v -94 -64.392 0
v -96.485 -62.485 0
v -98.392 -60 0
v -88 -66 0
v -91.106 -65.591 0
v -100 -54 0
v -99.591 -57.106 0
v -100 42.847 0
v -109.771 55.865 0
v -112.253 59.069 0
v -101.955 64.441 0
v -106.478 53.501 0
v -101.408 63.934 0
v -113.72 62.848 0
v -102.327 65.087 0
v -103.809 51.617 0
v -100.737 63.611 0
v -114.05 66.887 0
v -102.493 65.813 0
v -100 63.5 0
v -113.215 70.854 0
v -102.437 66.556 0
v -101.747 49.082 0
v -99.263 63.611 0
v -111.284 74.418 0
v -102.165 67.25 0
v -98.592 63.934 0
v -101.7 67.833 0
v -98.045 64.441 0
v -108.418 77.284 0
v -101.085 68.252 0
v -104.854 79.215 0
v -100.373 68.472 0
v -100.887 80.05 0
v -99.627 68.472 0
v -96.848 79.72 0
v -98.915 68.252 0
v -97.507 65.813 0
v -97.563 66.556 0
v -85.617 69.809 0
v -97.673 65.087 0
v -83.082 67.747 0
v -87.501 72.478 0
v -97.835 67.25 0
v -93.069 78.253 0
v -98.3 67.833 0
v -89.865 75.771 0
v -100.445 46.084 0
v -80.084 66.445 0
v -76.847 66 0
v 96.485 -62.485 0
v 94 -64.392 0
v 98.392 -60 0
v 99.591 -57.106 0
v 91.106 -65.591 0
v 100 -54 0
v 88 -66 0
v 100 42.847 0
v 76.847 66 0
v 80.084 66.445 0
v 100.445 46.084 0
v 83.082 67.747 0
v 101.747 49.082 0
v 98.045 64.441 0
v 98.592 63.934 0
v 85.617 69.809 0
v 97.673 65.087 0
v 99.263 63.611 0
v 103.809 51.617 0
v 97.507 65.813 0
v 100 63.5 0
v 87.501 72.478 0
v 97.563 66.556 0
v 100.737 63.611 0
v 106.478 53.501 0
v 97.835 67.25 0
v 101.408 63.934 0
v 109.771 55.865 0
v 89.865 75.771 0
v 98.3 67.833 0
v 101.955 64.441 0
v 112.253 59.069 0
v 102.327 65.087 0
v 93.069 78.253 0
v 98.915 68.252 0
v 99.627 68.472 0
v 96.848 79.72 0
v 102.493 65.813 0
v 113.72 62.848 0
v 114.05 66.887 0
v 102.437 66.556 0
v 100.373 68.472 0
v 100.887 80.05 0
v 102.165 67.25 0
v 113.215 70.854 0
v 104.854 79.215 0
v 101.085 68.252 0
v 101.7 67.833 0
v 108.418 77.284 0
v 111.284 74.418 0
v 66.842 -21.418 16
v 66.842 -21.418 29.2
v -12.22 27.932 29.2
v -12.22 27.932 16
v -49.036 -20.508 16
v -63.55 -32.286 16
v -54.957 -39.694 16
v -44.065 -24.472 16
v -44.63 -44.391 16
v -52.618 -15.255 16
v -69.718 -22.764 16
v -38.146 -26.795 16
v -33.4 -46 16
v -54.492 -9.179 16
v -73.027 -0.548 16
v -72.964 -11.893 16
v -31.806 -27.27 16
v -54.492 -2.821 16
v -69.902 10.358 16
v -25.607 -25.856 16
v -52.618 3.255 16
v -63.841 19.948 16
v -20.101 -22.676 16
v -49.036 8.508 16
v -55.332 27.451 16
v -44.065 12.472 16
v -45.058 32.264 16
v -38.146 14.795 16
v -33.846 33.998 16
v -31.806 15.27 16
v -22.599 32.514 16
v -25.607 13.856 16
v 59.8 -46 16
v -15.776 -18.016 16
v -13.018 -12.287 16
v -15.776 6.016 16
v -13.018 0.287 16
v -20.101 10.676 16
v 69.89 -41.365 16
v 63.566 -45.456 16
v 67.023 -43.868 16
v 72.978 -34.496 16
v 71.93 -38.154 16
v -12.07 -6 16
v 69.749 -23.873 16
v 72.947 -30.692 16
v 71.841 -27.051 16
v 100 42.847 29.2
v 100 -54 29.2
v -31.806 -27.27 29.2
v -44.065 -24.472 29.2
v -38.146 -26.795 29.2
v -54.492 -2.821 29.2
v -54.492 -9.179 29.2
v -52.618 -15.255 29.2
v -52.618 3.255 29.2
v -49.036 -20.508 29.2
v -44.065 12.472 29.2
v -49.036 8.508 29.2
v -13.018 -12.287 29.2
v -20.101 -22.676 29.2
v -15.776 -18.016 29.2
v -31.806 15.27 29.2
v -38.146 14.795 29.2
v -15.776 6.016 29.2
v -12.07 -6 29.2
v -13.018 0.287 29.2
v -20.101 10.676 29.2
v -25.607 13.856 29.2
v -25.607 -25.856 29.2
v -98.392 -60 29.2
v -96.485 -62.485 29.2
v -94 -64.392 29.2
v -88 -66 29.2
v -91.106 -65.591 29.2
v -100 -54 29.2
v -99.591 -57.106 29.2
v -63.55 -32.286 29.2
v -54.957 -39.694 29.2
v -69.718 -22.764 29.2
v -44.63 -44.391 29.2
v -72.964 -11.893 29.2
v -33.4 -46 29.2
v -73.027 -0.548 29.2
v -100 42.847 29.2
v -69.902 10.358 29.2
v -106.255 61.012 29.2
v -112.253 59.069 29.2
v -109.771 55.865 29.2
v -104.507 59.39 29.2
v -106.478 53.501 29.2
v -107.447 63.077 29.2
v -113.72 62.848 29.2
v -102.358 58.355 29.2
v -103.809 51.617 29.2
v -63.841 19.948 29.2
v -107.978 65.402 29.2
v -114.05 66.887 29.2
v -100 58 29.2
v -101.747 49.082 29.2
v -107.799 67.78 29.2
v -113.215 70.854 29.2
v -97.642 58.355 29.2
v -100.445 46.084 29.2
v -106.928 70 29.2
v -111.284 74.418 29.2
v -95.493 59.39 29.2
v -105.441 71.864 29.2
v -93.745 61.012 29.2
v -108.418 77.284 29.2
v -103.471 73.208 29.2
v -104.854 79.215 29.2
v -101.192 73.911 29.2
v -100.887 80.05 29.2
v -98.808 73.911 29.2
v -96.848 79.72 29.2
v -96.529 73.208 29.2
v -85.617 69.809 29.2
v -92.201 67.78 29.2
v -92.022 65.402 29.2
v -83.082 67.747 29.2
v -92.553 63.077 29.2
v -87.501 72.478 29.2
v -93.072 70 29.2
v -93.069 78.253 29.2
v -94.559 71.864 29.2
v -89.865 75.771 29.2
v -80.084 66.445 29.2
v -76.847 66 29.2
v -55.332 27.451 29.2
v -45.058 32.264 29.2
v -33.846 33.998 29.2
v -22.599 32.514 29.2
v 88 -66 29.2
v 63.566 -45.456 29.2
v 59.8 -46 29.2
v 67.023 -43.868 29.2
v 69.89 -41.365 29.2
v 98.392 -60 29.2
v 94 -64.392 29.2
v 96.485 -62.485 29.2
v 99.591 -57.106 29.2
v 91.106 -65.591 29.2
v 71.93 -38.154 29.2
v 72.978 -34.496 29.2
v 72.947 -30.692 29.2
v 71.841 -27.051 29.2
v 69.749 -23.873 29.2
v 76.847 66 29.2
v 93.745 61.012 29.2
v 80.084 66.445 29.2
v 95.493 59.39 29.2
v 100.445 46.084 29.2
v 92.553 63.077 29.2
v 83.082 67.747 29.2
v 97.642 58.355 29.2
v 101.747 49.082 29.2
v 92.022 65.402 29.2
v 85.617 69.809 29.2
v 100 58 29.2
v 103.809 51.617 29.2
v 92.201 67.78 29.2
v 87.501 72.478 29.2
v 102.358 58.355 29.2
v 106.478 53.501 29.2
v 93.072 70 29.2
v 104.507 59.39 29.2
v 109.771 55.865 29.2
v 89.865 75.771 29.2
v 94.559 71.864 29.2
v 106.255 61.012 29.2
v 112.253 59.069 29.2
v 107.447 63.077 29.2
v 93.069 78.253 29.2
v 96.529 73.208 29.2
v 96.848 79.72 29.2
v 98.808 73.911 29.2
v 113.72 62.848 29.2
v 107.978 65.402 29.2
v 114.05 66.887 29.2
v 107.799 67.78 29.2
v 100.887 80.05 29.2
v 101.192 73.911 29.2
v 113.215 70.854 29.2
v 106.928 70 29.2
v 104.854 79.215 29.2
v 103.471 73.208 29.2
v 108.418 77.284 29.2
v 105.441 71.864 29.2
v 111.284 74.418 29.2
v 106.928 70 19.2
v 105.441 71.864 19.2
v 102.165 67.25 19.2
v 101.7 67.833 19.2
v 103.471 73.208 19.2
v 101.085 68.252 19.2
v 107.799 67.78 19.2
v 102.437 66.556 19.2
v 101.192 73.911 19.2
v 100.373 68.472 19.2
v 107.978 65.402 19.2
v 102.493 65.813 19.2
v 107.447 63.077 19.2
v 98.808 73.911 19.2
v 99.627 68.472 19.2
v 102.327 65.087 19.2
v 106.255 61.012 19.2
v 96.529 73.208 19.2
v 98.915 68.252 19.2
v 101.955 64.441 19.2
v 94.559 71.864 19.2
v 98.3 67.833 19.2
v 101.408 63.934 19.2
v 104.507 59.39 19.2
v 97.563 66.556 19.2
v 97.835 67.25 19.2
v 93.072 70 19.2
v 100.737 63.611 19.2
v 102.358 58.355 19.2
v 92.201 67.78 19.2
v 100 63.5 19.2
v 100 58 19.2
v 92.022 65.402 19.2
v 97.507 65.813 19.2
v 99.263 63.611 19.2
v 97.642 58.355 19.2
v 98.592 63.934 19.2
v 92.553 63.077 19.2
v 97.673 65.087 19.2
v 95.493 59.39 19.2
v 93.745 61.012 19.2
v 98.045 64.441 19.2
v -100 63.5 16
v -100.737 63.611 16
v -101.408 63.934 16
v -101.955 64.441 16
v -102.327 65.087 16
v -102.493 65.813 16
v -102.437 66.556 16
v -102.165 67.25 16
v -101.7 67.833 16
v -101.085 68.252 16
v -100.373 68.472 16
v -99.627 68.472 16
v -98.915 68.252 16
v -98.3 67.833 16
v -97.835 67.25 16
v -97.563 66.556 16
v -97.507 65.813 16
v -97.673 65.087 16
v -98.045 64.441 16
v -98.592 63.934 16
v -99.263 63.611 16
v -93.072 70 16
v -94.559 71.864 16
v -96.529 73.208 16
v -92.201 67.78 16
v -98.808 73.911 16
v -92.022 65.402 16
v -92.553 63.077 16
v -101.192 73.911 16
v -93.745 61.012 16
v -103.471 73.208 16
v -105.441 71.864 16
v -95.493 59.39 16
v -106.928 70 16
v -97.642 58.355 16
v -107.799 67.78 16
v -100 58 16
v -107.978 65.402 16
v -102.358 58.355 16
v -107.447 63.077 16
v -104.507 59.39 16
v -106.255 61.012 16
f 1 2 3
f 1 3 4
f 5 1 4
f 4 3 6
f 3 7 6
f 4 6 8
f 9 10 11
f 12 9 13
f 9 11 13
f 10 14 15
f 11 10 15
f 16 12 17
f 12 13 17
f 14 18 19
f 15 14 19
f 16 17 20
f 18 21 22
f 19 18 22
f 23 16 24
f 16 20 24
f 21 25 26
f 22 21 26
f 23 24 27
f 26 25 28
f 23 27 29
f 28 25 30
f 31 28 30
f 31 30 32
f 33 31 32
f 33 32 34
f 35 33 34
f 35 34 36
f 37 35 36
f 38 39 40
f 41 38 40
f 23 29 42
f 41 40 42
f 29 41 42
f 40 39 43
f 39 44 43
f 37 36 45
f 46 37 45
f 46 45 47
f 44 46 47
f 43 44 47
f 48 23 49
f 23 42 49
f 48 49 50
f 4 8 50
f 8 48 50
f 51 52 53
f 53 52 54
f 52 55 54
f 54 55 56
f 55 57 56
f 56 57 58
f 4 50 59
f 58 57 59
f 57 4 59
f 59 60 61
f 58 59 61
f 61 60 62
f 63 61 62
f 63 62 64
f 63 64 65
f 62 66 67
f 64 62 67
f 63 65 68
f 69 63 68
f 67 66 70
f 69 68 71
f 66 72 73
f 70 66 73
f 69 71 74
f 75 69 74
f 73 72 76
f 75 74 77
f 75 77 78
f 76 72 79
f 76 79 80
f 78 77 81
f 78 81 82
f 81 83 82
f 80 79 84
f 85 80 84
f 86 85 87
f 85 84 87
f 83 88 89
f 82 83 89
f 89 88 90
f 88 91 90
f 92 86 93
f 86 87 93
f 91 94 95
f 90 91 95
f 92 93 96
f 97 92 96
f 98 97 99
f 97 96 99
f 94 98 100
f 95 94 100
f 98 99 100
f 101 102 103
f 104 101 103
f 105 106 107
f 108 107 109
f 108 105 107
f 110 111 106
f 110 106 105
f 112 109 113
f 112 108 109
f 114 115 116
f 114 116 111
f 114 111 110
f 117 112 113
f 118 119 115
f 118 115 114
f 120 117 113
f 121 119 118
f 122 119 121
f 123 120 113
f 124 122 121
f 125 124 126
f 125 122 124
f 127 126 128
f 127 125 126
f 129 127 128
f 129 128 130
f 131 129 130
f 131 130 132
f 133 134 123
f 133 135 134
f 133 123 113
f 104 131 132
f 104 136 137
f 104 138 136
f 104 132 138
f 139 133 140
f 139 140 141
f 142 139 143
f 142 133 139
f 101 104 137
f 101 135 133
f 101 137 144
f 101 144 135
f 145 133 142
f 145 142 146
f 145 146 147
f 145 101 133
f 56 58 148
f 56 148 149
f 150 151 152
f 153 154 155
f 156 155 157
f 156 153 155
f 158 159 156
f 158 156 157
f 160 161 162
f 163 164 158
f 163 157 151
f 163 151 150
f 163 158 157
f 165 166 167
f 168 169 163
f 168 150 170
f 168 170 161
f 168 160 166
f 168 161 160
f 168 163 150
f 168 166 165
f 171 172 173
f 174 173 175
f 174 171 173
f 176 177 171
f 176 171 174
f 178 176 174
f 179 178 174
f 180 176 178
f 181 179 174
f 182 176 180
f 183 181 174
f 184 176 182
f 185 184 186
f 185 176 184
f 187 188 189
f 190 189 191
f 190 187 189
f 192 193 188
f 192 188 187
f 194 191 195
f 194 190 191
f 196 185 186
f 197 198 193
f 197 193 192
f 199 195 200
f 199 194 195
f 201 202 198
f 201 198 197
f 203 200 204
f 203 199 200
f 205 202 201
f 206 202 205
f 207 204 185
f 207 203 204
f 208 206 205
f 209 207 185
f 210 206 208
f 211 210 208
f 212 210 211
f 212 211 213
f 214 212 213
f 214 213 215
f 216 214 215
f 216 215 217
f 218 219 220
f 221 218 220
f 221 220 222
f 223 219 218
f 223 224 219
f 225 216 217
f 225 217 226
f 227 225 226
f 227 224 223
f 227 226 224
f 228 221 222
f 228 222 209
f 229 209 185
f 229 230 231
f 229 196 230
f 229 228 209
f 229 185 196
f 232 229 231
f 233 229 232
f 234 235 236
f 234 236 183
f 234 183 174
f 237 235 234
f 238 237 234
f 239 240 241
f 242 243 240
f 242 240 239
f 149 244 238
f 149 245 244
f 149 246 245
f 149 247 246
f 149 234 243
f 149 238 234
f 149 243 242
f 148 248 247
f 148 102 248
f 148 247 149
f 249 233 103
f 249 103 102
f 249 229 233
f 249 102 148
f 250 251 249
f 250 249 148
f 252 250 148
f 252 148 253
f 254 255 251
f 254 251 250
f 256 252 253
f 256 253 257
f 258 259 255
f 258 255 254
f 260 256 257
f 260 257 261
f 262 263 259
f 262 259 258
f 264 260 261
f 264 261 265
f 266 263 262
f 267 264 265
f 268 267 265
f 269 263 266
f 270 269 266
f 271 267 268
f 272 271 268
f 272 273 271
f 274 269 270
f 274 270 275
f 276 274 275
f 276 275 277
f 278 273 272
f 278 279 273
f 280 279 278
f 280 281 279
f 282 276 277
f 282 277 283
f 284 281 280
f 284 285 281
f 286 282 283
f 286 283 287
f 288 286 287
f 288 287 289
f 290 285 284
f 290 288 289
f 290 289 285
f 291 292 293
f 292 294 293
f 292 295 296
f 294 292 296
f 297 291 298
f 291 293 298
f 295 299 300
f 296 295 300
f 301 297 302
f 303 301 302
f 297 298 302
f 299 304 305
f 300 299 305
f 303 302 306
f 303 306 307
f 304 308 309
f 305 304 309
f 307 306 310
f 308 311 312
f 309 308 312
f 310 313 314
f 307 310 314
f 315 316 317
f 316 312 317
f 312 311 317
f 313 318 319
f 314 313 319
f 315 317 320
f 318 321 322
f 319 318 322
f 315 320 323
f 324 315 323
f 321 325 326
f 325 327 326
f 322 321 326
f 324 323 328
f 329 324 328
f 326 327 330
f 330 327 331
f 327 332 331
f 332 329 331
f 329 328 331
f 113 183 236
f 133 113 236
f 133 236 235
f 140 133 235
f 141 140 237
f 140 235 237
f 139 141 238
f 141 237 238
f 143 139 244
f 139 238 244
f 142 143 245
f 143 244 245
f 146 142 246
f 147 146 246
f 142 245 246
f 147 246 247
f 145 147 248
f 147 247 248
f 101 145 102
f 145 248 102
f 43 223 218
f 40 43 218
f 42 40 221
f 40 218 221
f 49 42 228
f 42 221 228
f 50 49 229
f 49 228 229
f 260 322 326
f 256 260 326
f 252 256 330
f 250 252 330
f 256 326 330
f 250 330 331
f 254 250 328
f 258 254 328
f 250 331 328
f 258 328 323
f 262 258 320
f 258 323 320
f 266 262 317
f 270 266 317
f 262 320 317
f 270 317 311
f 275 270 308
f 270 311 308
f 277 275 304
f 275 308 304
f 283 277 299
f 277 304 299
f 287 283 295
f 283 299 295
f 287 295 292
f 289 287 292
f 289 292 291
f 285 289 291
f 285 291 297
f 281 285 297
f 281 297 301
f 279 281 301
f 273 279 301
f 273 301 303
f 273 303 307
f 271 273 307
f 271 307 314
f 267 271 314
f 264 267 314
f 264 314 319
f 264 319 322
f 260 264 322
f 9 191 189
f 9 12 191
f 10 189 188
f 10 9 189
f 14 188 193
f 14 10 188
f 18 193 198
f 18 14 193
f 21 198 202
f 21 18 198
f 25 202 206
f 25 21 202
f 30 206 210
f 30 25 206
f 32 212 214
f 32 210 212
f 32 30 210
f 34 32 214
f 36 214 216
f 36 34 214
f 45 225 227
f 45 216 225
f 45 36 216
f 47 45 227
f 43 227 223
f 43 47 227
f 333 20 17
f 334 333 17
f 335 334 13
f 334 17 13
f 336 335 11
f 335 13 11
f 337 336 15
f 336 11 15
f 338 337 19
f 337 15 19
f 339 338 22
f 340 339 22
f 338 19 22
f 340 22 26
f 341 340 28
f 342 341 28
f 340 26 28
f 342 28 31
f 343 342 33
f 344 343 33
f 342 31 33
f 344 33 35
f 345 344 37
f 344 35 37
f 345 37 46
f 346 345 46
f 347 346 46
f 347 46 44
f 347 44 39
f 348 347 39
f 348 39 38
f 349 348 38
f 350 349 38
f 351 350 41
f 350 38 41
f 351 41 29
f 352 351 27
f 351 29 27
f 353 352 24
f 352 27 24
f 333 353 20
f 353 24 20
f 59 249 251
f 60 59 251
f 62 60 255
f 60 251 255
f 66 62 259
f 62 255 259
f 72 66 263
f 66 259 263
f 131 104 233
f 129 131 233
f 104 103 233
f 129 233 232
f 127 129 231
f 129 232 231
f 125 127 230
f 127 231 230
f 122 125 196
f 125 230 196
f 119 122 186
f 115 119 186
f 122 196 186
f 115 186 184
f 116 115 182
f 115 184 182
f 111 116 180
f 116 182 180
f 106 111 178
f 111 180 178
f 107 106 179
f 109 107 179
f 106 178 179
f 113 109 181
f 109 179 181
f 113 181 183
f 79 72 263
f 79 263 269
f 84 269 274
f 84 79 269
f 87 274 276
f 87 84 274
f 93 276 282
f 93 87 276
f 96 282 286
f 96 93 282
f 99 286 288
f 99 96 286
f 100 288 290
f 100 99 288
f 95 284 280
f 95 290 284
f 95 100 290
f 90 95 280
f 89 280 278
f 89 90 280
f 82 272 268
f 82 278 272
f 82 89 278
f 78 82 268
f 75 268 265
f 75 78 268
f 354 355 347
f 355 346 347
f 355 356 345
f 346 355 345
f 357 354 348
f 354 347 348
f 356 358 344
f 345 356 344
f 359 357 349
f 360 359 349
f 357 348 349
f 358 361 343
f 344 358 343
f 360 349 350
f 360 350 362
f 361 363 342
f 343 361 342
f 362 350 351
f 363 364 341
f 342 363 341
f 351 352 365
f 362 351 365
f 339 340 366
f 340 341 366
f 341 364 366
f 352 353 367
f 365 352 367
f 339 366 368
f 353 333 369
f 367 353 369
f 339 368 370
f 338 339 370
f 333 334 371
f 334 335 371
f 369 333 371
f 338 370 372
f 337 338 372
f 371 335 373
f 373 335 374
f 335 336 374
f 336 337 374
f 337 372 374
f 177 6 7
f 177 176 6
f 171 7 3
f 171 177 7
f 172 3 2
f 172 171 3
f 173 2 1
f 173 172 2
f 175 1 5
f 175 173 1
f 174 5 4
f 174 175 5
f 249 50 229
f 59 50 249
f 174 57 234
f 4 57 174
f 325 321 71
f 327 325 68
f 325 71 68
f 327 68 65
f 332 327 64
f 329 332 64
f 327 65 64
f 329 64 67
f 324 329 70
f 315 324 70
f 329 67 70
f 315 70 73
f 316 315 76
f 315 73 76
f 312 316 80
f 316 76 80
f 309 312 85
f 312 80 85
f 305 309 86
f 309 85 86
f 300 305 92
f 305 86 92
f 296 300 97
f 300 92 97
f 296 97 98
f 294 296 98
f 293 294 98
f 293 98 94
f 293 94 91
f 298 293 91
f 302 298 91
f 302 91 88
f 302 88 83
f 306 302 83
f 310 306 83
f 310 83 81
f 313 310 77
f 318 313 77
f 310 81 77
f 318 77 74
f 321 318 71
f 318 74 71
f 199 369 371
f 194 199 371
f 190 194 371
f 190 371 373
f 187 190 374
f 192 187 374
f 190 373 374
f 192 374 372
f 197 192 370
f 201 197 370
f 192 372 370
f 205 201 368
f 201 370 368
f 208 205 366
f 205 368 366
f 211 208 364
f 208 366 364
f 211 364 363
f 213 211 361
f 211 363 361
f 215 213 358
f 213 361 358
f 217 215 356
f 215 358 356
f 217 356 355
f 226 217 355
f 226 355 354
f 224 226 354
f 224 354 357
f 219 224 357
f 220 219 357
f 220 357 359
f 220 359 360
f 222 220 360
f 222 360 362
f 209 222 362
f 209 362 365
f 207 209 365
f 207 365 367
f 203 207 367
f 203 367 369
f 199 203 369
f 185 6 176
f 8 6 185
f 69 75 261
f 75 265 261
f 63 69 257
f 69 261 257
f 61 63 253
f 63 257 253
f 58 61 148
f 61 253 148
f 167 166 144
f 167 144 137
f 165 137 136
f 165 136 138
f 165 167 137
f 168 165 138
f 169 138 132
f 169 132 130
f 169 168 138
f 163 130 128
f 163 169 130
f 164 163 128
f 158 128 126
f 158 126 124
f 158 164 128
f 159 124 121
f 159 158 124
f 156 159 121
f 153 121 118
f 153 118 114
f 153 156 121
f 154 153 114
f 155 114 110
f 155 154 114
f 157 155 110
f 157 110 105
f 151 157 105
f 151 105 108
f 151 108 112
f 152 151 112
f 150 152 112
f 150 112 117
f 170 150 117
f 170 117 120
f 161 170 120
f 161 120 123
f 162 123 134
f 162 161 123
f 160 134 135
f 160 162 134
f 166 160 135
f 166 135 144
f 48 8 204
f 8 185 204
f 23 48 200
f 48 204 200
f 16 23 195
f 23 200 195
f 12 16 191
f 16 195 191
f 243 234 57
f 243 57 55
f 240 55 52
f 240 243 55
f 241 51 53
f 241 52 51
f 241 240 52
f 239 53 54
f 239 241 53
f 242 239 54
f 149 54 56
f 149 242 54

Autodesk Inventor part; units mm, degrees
ref_plane "YZ Plane" through (0, 0, 0) normal (1, 0, 0) x (0, 1, 0)
ref_plane "XZ Plane" through (0, 0, 0) normal (0, 1, 0) x (-1, 0, 0)
ref_plane "XY Plane" through (0, 0, 0) normal (0, 0, 1) x (1, 0, 0)
sketch "Sketch1" plane through (0, 0, 0) normal (0, 0, 1) x (1, 0, 0)
  line L0 (-85.9222, 66) -> (85.9222, 66)
  line L1 (100, 51.9222) -> (100, -66)
  line L2 (100, -66) -> (-100, -66)
  line L3 (-100, -66) -> (-100, 51.9222)
  line L4 (-100, 66) -> (100, -66) construction
  line L5 (100, 66) -> (-100, -66) construction
  arc A0 (-85.9222, 66) -> (-100, 51.9222) centre (-100, 66) ccw
  arc A1 (100, 51.9222) -> (85.9222, 66) centre (100, 66) ccw
  line L6 (0, 116.2908) -> (0, -96.3818) projected
  line L7 (-167.8726, 0) -> (167.8726, 0) projected
  point P0 (0, 0)
  dimension "d0" = 200
  dimension "d1" = 132
  dimension "d3" = 28.1556
  dimension "d35" = 200
extrude "Extrusion1" add sketch "Sketch1" along normal blind 29.2
fillet "Fillet1" radius 12 6 edges at (-85.9222, 66, 14.6) (85.9222, 66, 14.6) (-100, 51.9222, 14.6) (-100, -66, 14.6) (100, -66, 14.6) (100, 51.9222, 14.6)
sketch "Sketch2" plane through (0, 0, 29.2) normal (0, 0, 1) x (1, 0, 0)
  arc A0 (-87.5012, 72.4781) -> (-106.4781, 53.5012) centre (-100, 66) ccw projected
  circle A1 centre (-33.4, -6) radius 21.33
  arc A2 (-12.2198, 27.9323) -> (-33.4, -46) centre (-33.4, -6) ccw
  arc A3 (59.8, -46) -> (66.8424, -21.4175) centre (59.8, -32.7) ccw
  line L0 (-33.4, -46) -> (59.8, -46)
  line L1 (66.8424, -21.4175) -> (-12.2198, 27.9323)
  point P0 (-88, -66)
  point P1 (0, 0)
  dimension "d7" = 42.66
  dimension "d8" = 60
  dimension "d9" = 66.6
  dimension "d10" = 80
  dimension "d12" = 93.2
  dimension "d13" = 26.6
extrude "Extrusion2" cut sketch "Sketch2" against normal blind 13.2
hole "Hole1" at (-100, 66, 29.2) direction (0, 0, -1) diameter 5 end through all counterbore diameter 16 counterbore depth 13.2
hole "Hole2" at (100, 66, 29.2) direction (0, 0, -1) diameter 5 end through all counterbore diameter 16 counterbore depth 10
equation "\"d1\" = 0.66 * d0"
equation "\"d3\" = 0.2133 * d1"
equation "\"d35\" = d0"
equation "\"d4\" = 0.146 * d0"
equation "\"d6\" = 0.06 * d0"
equation "\"d7\" = 0.2133 * d0"
equation "\"d8\" = 0.3 * d0"
equation "\"d9\" = 0.333 * d0"
equation "\"d10\" = 0.4 * d0"
equation "\"d12\" = 0.466 * d0"
equation "\"d13\" = 0.133 * d0"
equation "\"d15\" = 0.066 * d0"
equation "\"d21\" = 0.08 * d0"
equation "\"d22\" = 0.066 * d0"
equation "\"d30\" = 0.08 * d0"
equation "\"d31\" = 0.05 * d0"
properties part number "Tutorial1"
